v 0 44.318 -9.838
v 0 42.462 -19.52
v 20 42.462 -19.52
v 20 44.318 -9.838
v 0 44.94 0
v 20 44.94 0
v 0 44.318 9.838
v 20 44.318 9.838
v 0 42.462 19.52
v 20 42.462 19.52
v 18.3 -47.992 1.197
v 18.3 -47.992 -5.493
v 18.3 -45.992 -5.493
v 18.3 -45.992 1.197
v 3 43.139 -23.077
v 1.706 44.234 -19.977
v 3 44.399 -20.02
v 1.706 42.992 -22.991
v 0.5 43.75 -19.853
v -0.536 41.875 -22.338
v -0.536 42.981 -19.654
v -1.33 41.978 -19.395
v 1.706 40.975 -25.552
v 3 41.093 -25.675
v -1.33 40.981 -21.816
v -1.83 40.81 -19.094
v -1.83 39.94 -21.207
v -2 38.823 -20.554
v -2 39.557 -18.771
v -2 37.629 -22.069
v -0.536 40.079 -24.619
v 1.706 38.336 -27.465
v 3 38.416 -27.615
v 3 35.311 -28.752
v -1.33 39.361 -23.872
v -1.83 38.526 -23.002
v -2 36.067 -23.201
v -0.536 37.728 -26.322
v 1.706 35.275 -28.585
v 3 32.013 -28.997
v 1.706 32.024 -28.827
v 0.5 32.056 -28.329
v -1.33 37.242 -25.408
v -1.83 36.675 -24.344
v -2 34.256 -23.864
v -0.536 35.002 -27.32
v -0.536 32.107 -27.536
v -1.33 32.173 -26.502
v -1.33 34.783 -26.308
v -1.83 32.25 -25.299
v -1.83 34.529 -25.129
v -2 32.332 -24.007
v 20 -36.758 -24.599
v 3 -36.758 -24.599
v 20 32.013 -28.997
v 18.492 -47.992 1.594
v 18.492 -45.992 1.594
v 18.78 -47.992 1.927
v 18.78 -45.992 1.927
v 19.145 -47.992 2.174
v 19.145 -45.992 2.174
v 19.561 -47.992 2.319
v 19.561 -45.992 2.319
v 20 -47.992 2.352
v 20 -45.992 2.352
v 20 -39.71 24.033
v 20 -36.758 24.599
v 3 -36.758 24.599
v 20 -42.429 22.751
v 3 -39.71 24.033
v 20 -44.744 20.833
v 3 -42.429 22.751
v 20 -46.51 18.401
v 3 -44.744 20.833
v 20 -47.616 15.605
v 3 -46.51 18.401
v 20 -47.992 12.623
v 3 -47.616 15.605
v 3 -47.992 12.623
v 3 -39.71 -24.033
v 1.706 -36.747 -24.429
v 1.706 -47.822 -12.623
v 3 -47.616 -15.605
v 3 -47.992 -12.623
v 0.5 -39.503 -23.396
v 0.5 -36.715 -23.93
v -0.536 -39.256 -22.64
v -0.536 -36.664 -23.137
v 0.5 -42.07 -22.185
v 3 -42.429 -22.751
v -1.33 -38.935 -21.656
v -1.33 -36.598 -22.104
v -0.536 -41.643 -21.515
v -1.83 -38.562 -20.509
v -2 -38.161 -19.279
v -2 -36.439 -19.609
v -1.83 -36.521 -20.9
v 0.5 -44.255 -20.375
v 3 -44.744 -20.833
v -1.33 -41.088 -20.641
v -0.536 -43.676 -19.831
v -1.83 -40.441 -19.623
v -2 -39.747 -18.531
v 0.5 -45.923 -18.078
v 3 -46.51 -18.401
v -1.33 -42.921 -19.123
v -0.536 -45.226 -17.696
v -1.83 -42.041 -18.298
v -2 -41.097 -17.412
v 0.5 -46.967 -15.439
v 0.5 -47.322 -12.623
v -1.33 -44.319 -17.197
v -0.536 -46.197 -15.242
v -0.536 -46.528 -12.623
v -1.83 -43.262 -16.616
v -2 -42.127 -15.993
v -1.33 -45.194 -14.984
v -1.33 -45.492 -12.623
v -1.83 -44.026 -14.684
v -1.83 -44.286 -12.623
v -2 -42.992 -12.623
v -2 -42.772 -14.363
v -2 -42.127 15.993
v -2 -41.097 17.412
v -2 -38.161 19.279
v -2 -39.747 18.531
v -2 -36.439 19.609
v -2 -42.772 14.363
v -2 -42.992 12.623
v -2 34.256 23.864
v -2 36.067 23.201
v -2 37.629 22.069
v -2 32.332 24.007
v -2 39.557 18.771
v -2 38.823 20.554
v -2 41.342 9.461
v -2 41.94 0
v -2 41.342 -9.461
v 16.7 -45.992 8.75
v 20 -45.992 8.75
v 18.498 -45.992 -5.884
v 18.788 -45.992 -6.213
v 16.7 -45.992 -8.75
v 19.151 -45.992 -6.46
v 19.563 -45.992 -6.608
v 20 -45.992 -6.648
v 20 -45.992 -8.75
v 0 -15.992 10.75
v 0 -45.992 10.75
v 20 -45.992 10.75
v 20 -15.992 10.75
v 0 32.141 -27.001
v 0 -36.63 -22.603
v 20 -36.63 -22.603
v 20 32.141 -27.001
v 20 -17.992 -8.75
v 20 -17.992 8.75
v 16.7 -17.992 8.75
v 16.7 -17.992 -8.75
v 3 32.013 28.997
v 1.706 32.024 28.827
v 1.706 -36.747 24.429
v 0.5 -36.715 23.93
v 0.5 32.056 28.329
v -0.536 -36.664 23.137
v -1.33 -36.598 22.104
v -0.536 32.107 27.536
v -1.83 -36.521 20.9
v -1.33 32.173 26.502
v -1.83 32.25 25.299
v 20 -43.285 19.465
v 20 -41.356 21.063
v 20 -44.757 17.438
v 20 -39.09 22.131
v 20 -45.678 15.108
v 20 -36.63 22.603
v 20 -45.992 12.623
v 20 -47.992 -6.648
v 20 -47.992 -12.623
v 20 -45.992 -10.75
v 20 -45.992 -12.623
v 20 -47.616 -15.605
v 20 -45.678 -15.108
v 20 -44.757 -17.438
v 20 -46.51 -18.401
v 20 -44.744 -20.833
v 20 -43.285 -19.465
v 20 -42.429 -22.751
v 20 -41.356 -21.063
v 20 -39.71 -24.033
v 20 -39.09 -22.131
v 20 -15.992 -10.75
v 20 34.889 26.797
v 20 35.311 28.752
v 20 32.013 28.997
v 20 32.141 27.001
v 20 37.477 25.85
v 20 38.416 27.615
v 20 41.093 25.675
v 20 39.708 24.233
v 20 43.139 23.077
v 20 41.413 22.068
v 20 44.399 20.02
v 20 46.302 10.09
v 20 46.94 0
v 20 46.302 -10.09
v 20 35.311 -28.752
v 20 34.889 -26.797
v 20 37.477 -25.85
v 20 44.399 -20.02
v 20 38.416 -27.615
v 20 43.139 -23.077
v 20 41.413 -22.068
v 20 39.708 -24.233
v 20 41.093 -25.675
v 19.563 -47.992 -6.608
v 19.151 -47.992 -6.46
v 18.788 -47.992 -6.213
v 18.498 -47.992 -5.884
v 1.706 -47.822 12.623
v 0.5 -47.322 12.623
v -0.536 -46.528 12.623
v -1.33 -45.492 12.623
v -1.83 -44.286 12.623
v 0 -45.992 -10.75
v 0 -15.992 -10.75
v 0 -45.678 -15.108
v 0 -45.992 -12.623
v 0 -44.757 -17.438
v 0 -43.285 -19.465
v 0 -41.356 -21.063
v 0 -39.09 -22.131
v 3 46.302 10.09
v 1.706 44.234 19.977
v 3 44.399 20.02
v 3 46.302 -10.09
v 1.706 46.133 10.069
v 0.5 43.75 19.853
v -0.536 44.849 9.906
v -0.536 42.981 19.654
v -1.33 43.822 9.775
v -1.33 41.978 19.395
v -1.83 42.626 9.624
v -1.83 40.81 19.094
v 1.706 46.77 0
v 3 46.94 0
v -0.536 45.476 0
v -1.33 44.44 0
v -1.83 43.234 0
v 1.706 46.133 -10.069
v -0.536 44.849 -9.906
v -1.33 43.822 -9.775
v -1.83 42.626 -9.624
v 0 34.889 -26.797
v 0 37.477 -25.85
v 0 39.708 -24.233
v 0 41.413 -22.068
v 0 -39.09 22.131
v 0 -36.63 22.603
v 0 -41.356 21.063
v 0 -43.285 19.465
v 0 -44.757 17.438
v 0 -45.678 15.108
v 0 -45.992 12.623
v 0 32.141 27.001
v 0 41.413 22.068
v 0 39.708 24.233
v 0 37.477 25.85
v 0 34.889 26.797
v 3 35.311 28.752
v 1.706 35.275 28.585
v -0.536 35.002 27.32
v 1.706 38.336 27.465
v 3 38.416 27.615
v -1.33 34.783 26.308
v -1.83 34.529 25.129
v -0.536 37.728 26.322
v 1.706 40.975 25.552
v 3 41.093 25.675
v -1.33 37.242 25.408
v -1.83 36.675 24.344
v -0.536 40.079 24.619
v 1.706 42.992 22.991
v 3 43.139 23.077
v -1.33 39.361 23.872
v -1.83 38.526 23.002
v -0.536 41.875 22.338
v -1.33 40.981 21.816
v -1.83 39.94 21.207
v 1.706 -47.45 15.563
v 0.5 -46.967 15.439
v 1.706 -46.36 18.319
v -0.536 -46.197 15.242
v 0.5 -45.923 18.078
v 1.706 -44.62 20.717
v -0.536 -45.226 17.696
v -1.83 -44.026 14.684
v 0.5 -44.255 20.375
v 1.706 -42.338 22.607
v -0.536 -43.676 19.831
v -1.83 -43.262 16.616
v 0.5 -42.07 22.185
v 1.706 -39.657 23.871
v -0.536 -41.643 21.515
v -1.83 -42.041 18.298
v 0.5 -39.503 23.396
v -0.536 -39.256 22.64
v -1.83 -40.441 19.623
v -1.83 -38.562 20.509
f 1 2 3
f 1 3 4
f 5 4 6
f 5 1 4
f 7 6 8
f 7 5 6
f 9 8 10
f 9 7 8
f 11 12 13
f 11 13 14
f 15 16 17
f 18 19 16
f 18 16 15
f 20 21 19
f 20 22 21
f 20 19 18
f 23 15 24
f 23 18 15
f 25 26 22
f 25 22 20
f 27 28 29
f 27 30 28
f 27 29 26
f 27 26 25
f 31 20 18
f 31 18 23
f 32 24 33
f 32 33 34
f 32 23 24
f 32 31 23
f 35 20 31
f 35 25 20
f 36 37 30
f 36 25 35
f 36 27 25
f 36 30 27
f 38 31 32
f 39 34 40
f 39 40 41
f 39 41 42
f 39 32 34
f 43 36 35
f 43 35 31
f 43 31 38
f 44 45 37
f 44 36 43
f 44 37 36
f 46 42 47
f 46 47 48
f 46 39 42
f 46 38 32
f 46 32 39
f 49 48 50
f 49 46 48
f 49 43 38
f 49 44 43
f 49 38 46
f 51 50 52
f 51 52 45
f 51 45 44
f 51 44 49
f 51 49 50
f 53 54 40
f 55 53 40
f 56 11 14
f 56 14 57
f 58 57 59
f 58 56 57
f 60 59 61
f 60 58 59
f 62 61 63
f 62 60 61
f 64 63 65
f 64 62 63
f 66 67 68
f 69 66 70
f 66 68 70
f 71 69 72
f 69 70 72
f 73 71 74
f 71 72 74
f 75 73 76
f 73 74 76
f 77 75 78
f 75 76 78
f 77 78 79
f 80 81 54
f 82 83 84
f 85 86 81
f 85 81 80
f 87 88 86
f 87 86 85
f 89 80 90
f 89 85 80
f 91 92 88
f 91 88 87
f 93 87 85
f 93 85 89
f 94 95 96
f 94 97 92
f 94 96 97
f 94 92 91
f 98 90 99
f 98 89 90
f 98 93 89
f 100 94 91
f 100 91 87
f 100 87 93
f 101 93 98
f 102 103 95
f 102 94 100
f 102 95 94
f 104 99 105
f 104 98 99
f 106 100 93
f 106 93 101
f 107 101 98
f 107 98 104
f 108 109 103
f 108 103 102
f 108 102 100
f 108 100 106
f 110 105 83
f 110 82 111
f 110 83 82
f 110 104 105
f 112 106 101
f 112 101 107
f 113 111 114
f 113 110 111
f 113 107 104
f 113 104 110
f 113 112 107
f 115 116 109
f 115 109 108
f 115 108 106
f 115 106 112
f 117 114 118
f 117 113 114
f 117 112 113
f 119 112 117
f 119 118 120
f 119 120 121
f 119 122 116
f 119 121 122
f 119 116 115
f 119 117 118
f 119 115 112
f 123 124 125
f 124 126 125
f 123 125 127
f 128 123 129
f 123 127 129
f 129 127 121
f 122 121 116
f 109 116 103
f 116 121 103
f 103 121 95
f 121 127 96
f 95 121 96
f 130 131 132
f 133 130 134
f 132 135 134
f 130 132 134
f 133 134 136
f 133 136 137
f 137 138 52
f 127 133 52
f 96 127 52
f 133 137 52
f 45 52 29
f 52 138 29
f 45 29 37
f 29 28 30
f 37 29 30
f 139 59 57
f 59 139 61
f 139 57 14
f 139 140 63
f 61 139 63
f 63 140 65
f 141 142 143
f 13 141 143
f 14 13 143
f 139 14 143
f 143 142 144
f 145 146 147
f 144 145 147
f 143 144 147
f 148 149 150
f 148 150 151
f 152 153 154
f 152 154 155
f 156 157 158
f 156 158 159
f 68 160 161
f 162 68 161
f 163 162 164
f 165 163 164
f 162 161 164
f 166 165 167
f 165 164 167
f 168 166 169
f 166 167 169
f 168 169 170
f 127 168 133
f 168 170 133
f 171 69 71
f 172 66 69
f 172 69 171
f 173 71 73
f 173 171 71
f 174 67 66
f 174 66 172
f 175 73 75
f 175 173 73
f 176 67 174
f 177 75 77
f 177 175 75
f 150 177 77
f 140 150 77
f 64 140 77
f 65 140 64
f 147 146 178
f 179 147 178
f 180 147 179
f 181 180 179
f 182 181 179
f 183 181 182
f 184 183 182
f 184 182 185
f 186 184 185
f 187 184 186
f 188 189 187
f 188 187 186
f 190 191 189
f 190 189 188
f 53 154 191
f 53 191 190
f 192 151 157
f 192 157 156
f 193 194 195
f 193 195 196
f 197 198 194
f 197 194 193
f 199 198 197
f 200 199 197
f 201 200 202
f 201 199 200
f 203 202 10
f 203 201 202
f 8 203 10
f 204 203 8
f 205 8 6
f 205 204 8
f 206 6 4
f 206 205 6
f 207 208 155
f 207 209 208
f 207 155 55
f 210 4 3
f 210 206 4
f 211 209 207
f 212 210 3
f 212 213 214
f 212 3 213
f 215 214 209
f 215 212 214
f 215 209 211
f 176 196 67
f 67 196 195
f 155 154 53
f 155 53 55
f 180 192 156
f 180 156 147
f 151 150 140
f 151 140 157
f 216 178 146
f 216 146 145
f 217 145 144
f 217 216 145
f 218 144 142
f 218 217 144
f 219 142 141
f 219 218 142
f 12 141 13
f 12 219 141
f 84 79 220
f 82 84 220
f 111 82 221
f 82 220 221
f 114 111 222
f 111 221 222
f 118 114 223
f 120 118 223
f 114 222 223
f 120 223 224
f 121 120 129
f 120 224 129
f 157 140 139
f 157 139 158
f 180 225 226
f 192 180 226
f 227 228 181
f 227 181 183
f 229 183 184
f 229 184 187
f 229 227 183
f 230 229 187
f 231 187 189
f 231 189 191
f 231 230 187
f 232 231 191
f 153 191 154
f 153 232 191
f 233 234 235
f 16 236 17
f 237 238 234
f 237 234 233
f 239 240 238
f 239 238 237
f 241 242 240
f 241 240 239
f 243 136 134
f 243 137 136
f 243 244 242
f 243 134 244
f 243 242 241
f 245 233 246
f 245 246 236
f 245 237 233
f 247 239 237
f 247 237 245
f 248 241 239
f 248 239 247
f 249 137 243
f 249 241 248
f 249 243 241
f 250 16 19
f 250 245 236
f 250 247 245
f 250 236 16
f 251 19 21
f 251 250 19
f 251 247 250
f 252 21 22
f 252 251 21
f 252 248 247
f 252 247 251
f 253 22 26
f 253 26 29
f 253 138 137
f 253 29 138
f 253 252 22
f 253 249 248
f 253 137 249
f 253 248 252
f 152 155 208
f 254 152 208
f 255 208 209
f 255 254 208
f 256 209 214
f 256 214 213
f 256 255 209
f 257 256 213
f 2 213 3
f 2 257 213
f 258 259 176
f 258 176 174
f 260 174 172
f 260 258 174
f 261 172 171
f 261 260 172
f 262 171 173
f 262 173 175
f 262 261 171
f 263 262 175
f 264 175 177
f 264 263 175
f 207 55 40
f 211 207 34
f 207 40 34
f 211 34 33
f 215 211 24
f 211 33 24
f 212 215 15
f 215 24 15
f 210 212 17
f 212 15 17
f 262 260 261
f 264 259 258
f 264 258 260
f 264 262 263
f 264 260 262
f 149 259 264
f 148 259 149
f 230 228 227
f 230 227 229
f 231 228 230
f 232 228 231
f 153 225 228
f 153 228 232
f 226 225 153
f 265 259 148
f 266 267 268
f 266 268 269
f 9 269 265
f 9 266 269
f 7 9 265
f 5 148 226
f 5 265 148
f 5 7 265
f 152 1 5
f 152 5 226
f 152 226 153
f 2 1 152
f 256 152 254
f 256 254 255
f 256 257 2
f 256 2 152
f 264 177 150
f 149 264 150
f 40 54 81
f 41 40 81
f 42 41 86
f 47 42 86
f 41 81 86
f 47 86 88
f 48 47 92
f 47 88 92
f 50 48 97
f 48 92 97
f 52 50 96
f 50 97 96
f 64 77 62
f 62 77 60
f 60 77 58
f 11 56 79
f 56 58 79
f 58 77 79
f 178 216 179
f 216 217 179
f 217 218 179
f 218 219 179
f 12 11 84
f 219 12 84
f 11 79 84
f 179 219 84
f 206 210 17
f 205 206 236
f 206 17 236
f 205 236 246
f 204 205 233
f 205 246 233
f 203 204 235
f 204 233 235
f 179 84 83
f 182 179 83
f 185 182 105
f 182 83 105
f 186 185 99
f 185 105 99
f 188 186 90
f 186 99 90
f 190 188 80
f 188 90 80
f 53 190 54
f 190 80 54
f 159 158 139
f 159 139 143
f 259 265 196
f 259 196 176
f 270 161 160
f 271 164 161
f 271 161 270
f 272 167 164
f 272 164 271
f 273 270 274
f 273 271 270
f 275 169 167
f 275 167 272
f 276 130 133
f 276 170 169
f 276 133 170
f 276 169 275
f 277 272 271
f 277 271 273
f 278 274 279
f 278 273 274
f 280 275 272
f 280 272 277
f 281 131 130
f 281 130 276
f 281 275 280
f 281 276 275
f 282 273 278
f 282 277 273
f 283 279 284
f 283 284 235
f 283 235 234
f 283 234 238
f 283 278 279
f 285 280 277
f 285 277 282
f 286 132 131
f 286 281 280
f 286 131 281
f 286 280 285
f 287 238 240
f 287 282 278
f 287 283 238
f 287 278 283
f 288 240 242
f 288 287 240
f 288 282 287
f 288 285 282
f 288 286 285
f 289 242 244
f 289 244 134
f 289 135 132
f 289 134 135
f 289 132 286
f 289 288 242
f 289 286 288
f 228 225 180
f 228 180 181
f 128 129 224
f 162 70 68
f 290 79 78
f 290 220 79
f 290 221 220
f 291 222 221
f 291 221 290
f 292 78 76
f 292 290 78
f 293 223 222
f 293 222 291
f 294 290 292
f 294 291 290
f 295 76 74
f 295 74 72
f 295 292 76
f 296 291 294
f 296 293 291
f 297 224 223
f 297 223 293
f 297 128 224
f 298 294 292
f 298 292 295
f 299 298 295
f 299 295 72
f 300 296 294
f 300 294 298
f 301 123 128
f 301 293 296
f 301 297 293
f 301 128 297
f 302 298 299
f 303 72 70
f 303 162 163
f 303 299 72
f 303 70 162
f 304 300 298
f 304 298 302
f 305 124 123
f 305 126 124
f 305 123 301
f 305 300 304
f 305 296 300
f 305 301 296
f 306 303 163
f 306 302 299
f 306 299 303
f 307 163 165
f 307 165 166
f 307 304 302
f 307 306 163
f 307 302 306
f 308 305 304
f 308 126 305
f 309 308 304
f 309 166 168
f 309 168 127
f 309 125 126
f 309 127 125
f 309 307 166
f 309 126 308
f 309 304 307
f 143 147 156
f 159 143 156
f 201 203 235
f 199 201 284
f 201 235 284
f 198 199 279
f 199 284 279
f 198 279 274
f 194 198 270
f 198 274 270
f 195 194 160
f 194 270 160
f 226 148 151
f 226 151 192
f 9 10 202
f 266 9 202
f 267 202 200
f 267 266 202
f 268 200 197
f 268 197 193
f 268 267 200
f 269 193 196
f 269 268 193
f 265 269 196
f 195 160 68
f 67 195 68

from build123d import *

# Parameters (mm, degrees)
BOSS_EXTRUDE1_DEPTH = 20
SHELL4_T            = 2
FILLET2_R           = 5
SKETCH3_W           = 21.5
SKETCH3_H           = 30
BOSS_EXTRUDE2_DEPTH = 20
SKETCH4_W           = 17.5
SKETCH4_H           = 28
CUT_EXTRUDE1_DEPTH  = 3.3
CUT_EXTRUDE2_DEPTH  = 2


with BuildPart() as part:
    # Sketch2 → Boss-Extrude1 (new body)
    with BuildSketch(Plane(origin=(0, 0, 0), x_dir=(0, 0, -1), z_dir=(1, 0, 0))):
        with BuildLine():
            Line((-27.001202387, 32.141013477), (-22.602835252, -36.63027149))
            ThreePointArc((-22.602835252, -36.63027149), (-19.464913087, -43.285247796), (-12.623224858, -45.992011054))
            Line((-12.623224858, -45.992011054), (12.623224858, -45.992011054))
            ThreePointArc((12.623224858, -45.992011054), (19.464913087, -43.285247796), (22.602835252, -36.63027149))
            Line((22.602835252, -36.63027149), (27.001202387, 32.141013477))
            ThreePointArc((27.001202387, 32.141013477), (25.118351891, 38.648045435), (19.520174304, 42.462098214))
            ThreePointArc((19.520174304, 42.462098214), (0, 44.940033366), (-19.520174304, 42.462098214))
            ThreePointArc((-19.520174304, 42.462098214), (-25.118351891, 38.648045435), (-27.001202387, 32.141013477))
        make_face()
    extrude(amount=BOSS_EXTRUDE1_DEPTH)

    # Shell4
    shell4_openings = [part.faces().sort_by_distance(p)[0] for p in [
        (20, 0.52350314, 0),
    ]]
    offset(amount=SHELL4_T, openings=shell4_openings, kind=Kind.INTERSECTION)

    # Fillet2
    # the kernel refuses this fillet: 5 mm, written as the material it takes off along each edge
    with BuildSketch(Plane(origin=(-2, -47.992011054, 12.623224858), x_dir=(1, 0, 0), z_dir=(0, 0, -1))) as fillet2_piece_1:
        with BuildLine():
            CenterArc((FILLET2_R, -FILLET2_R), FILLET2_R, 90, 90)
            Line((0, -FILLET2_R), (0, 0))
            Line((0, 0), (FILLET2_R, 0))
        make_face()
    extrude(amount=25.246449717, mode=Mode.SUBTRACT)
    with BuildSketch(Plane(origin=(-2, -35.992011054, 12.623224858), x_dir=(0, -1, 0), z_dir=(0, 0, -1))) as fillet2_piece_2:
        with BuildLine():
            CenterArc((12 - FILLET2_R, -FILLET2_R), FILLET2_R, 0, 90)
            Line((12 - FILLET2_R, 0), (12, 0))
            Line((12, 0), (12, -FILLET2_R))
        make_face()
    revolve(axis=Axis((-2, -35.992011054, 12.623224858), (-1, 0, 0)), revolution_arc=86.340549578, mode=Mode.SUBTRACT)
    with BuildSketch(Plane(origin=(-2, 32.01336139, 28.997124466), x_dir=(1, 0, 0), z_dir=(0, -0.997961039394411, -0.06382604367205215)), Plane(origin=(-2, -36.757923578, -24.598757331), x_dir=(1, 0, 0), z_dir=(0, 0.9979610393944109, -0.06382604367205376))) as fillet2_piece_3:
        with BuildLine():
            CenterArc((FILLET2_R, -FILLET2_R), FILLET2_R, 90, 90)
            Line((0, -FILLET2_R), (0, 0))
            Line((0, 0), (FILLET2_R, 0))
        make_face()
    extrude(amount=68.911793399, mode=Mode.SUBTRACT)
    with BuildSketch(Plane(origin=(-2, 32.779273914, 17.021591993), x_dir=(0, -0.06382604367205197, 0.997961039394411), z_dir=(0, -0.997961039394411, -0.06382604367205197))) as fillet2_piece_4:
        with BuildLine():
            CenterArc((12 - FILLET2_R, -FILLET2_R), FILLET2_R, 0, 90)
            Line((12 - FILLET2_R, 0), (12, 0))
            Line((12, 0), (12, -FILLET2_R))
        make_face()
    revolve(axis=Axis((-2, 32.779273914, 17.021591993), (-1, 0, 0)), revolution_arc=79.190327228, mode=Mode.SUBTRACT)
    with BuildSketch(Plane(origin=(-2, -33.184966634, 0), x_dir=(0, 0.9682824300555203, 0.249858231094708), z_dir=(0, -0.249858231094708, 0.9682824300555203))) as fillet2_piece_5:
        with BuildLine():
            CenterArc((80.125 - FILLET2_R, -FILLET2_R), FILLET2_R, 0, 90)
            Line((80.125 - FILLET2_R, 0), (80.125, 0))
            Line((80.125, 0), (80.125, -FILLET2_R))
        make_face()
    revolve(axis=Axis((-2, -33.184966634, 0), (-1, 0, 0)), revolution_arc=28.938246388, mode=Mode.SUBTRACT)
    with BuildSketch(Plane(origin=(-2, 32.779273914, -17.021591993), x_dir=(0, 0.9682824300555204, -0.24985823109470737), z_dir=(0, 0.24985823109470737, 0.9682824300555204))) as fillet2_piece_6:
        with BuildLine():
            CenterArc((12 - FILLET2_R, -FILLET2_R), FILLET2_R, 0, 90)
            Line((12 - FILLET2_R, 0), (12, 0))
            Line((12, 0), (12, -FILLET2_R))
        make_face()
    revolve(axis=Axis((-2, 32.779273914, -17.021591993), (-1, 0, 0)), revolution_arc=79.190327228, mode=Mode.SUBTRACT)
    with BuildSketch(Plane(origin=(-2, -35.992011054, -12.623224858), x_dir=(0, -0.06382604367205372, -0.9979610393944109), z_dir=(0, 0.9979610393944109, -0.06382604367205372))) as fillet2_piece_7:
        with BuildLine():
            CenterArc((12 - FILLET2_R, -FILLET2_R), FILLET2_R, 0, 90)
            Line((12 - FILLET2_R, 0), (12, 0))
            Line((12, 0), (12, -FILLET2_R))
        make_face()
    revolve(axis=Axis((-2, -35.992011054, -12.623224858), (-1, 0, 0)), revolution_arc=86.340549578, mode=Mode.SUBTRACT)

    # Sketch3 → Boss-Extrude2 (add)
    with BuildSketch(Plane(origin=(0, 0, 0), x_dir=(0, 0, -1), z_dir=(1, 0, 0))):
        with Locations((0, -30.992011054)):
            Rectangle(SKETCH3_W, SKETCH3_H)
    extrude(amount=BOSS_EXTRUDE2_DEPTH)

    # Sketch4 → Cut-Extrude1 (cut)
    with BuildSketch(Plane(origin=(20, 0, 0), x_dir=(0, 0, -1), z_dir=(1, 0, 0))):
        with Locations((0, -31.992011054)):
            Rectangle(SKETCH4_W, SKETCH4_H)
    extrude(amount=-CUT_EXTRUDE1_DEPTH, mode=Mode.SUBTRACT)

    # Sketch5 → Cut-Extrude2 (cut)
    with BuildSketch(Plane.XZ.offset(47.992011054)):
        with BuildLine():
            Line((20, 2.351775142), (20, -6.648224858))
            ThreePointArc((20, -6.648224858), (18.961461825, -6.347856856), (18.3, -5.492724858))
            Line((18.3, -5.492724858), (18.3, 1.197275142))
            ThreePointArc((18.3, 1.197275142), (18.954546218, 2.062330624), (20, 2.351775142))
        make_face()
    extrude(amount=-CUT_EXTRUDE2_DEPTH, mode=Mode.SUBTRACT)


solid = part.part
